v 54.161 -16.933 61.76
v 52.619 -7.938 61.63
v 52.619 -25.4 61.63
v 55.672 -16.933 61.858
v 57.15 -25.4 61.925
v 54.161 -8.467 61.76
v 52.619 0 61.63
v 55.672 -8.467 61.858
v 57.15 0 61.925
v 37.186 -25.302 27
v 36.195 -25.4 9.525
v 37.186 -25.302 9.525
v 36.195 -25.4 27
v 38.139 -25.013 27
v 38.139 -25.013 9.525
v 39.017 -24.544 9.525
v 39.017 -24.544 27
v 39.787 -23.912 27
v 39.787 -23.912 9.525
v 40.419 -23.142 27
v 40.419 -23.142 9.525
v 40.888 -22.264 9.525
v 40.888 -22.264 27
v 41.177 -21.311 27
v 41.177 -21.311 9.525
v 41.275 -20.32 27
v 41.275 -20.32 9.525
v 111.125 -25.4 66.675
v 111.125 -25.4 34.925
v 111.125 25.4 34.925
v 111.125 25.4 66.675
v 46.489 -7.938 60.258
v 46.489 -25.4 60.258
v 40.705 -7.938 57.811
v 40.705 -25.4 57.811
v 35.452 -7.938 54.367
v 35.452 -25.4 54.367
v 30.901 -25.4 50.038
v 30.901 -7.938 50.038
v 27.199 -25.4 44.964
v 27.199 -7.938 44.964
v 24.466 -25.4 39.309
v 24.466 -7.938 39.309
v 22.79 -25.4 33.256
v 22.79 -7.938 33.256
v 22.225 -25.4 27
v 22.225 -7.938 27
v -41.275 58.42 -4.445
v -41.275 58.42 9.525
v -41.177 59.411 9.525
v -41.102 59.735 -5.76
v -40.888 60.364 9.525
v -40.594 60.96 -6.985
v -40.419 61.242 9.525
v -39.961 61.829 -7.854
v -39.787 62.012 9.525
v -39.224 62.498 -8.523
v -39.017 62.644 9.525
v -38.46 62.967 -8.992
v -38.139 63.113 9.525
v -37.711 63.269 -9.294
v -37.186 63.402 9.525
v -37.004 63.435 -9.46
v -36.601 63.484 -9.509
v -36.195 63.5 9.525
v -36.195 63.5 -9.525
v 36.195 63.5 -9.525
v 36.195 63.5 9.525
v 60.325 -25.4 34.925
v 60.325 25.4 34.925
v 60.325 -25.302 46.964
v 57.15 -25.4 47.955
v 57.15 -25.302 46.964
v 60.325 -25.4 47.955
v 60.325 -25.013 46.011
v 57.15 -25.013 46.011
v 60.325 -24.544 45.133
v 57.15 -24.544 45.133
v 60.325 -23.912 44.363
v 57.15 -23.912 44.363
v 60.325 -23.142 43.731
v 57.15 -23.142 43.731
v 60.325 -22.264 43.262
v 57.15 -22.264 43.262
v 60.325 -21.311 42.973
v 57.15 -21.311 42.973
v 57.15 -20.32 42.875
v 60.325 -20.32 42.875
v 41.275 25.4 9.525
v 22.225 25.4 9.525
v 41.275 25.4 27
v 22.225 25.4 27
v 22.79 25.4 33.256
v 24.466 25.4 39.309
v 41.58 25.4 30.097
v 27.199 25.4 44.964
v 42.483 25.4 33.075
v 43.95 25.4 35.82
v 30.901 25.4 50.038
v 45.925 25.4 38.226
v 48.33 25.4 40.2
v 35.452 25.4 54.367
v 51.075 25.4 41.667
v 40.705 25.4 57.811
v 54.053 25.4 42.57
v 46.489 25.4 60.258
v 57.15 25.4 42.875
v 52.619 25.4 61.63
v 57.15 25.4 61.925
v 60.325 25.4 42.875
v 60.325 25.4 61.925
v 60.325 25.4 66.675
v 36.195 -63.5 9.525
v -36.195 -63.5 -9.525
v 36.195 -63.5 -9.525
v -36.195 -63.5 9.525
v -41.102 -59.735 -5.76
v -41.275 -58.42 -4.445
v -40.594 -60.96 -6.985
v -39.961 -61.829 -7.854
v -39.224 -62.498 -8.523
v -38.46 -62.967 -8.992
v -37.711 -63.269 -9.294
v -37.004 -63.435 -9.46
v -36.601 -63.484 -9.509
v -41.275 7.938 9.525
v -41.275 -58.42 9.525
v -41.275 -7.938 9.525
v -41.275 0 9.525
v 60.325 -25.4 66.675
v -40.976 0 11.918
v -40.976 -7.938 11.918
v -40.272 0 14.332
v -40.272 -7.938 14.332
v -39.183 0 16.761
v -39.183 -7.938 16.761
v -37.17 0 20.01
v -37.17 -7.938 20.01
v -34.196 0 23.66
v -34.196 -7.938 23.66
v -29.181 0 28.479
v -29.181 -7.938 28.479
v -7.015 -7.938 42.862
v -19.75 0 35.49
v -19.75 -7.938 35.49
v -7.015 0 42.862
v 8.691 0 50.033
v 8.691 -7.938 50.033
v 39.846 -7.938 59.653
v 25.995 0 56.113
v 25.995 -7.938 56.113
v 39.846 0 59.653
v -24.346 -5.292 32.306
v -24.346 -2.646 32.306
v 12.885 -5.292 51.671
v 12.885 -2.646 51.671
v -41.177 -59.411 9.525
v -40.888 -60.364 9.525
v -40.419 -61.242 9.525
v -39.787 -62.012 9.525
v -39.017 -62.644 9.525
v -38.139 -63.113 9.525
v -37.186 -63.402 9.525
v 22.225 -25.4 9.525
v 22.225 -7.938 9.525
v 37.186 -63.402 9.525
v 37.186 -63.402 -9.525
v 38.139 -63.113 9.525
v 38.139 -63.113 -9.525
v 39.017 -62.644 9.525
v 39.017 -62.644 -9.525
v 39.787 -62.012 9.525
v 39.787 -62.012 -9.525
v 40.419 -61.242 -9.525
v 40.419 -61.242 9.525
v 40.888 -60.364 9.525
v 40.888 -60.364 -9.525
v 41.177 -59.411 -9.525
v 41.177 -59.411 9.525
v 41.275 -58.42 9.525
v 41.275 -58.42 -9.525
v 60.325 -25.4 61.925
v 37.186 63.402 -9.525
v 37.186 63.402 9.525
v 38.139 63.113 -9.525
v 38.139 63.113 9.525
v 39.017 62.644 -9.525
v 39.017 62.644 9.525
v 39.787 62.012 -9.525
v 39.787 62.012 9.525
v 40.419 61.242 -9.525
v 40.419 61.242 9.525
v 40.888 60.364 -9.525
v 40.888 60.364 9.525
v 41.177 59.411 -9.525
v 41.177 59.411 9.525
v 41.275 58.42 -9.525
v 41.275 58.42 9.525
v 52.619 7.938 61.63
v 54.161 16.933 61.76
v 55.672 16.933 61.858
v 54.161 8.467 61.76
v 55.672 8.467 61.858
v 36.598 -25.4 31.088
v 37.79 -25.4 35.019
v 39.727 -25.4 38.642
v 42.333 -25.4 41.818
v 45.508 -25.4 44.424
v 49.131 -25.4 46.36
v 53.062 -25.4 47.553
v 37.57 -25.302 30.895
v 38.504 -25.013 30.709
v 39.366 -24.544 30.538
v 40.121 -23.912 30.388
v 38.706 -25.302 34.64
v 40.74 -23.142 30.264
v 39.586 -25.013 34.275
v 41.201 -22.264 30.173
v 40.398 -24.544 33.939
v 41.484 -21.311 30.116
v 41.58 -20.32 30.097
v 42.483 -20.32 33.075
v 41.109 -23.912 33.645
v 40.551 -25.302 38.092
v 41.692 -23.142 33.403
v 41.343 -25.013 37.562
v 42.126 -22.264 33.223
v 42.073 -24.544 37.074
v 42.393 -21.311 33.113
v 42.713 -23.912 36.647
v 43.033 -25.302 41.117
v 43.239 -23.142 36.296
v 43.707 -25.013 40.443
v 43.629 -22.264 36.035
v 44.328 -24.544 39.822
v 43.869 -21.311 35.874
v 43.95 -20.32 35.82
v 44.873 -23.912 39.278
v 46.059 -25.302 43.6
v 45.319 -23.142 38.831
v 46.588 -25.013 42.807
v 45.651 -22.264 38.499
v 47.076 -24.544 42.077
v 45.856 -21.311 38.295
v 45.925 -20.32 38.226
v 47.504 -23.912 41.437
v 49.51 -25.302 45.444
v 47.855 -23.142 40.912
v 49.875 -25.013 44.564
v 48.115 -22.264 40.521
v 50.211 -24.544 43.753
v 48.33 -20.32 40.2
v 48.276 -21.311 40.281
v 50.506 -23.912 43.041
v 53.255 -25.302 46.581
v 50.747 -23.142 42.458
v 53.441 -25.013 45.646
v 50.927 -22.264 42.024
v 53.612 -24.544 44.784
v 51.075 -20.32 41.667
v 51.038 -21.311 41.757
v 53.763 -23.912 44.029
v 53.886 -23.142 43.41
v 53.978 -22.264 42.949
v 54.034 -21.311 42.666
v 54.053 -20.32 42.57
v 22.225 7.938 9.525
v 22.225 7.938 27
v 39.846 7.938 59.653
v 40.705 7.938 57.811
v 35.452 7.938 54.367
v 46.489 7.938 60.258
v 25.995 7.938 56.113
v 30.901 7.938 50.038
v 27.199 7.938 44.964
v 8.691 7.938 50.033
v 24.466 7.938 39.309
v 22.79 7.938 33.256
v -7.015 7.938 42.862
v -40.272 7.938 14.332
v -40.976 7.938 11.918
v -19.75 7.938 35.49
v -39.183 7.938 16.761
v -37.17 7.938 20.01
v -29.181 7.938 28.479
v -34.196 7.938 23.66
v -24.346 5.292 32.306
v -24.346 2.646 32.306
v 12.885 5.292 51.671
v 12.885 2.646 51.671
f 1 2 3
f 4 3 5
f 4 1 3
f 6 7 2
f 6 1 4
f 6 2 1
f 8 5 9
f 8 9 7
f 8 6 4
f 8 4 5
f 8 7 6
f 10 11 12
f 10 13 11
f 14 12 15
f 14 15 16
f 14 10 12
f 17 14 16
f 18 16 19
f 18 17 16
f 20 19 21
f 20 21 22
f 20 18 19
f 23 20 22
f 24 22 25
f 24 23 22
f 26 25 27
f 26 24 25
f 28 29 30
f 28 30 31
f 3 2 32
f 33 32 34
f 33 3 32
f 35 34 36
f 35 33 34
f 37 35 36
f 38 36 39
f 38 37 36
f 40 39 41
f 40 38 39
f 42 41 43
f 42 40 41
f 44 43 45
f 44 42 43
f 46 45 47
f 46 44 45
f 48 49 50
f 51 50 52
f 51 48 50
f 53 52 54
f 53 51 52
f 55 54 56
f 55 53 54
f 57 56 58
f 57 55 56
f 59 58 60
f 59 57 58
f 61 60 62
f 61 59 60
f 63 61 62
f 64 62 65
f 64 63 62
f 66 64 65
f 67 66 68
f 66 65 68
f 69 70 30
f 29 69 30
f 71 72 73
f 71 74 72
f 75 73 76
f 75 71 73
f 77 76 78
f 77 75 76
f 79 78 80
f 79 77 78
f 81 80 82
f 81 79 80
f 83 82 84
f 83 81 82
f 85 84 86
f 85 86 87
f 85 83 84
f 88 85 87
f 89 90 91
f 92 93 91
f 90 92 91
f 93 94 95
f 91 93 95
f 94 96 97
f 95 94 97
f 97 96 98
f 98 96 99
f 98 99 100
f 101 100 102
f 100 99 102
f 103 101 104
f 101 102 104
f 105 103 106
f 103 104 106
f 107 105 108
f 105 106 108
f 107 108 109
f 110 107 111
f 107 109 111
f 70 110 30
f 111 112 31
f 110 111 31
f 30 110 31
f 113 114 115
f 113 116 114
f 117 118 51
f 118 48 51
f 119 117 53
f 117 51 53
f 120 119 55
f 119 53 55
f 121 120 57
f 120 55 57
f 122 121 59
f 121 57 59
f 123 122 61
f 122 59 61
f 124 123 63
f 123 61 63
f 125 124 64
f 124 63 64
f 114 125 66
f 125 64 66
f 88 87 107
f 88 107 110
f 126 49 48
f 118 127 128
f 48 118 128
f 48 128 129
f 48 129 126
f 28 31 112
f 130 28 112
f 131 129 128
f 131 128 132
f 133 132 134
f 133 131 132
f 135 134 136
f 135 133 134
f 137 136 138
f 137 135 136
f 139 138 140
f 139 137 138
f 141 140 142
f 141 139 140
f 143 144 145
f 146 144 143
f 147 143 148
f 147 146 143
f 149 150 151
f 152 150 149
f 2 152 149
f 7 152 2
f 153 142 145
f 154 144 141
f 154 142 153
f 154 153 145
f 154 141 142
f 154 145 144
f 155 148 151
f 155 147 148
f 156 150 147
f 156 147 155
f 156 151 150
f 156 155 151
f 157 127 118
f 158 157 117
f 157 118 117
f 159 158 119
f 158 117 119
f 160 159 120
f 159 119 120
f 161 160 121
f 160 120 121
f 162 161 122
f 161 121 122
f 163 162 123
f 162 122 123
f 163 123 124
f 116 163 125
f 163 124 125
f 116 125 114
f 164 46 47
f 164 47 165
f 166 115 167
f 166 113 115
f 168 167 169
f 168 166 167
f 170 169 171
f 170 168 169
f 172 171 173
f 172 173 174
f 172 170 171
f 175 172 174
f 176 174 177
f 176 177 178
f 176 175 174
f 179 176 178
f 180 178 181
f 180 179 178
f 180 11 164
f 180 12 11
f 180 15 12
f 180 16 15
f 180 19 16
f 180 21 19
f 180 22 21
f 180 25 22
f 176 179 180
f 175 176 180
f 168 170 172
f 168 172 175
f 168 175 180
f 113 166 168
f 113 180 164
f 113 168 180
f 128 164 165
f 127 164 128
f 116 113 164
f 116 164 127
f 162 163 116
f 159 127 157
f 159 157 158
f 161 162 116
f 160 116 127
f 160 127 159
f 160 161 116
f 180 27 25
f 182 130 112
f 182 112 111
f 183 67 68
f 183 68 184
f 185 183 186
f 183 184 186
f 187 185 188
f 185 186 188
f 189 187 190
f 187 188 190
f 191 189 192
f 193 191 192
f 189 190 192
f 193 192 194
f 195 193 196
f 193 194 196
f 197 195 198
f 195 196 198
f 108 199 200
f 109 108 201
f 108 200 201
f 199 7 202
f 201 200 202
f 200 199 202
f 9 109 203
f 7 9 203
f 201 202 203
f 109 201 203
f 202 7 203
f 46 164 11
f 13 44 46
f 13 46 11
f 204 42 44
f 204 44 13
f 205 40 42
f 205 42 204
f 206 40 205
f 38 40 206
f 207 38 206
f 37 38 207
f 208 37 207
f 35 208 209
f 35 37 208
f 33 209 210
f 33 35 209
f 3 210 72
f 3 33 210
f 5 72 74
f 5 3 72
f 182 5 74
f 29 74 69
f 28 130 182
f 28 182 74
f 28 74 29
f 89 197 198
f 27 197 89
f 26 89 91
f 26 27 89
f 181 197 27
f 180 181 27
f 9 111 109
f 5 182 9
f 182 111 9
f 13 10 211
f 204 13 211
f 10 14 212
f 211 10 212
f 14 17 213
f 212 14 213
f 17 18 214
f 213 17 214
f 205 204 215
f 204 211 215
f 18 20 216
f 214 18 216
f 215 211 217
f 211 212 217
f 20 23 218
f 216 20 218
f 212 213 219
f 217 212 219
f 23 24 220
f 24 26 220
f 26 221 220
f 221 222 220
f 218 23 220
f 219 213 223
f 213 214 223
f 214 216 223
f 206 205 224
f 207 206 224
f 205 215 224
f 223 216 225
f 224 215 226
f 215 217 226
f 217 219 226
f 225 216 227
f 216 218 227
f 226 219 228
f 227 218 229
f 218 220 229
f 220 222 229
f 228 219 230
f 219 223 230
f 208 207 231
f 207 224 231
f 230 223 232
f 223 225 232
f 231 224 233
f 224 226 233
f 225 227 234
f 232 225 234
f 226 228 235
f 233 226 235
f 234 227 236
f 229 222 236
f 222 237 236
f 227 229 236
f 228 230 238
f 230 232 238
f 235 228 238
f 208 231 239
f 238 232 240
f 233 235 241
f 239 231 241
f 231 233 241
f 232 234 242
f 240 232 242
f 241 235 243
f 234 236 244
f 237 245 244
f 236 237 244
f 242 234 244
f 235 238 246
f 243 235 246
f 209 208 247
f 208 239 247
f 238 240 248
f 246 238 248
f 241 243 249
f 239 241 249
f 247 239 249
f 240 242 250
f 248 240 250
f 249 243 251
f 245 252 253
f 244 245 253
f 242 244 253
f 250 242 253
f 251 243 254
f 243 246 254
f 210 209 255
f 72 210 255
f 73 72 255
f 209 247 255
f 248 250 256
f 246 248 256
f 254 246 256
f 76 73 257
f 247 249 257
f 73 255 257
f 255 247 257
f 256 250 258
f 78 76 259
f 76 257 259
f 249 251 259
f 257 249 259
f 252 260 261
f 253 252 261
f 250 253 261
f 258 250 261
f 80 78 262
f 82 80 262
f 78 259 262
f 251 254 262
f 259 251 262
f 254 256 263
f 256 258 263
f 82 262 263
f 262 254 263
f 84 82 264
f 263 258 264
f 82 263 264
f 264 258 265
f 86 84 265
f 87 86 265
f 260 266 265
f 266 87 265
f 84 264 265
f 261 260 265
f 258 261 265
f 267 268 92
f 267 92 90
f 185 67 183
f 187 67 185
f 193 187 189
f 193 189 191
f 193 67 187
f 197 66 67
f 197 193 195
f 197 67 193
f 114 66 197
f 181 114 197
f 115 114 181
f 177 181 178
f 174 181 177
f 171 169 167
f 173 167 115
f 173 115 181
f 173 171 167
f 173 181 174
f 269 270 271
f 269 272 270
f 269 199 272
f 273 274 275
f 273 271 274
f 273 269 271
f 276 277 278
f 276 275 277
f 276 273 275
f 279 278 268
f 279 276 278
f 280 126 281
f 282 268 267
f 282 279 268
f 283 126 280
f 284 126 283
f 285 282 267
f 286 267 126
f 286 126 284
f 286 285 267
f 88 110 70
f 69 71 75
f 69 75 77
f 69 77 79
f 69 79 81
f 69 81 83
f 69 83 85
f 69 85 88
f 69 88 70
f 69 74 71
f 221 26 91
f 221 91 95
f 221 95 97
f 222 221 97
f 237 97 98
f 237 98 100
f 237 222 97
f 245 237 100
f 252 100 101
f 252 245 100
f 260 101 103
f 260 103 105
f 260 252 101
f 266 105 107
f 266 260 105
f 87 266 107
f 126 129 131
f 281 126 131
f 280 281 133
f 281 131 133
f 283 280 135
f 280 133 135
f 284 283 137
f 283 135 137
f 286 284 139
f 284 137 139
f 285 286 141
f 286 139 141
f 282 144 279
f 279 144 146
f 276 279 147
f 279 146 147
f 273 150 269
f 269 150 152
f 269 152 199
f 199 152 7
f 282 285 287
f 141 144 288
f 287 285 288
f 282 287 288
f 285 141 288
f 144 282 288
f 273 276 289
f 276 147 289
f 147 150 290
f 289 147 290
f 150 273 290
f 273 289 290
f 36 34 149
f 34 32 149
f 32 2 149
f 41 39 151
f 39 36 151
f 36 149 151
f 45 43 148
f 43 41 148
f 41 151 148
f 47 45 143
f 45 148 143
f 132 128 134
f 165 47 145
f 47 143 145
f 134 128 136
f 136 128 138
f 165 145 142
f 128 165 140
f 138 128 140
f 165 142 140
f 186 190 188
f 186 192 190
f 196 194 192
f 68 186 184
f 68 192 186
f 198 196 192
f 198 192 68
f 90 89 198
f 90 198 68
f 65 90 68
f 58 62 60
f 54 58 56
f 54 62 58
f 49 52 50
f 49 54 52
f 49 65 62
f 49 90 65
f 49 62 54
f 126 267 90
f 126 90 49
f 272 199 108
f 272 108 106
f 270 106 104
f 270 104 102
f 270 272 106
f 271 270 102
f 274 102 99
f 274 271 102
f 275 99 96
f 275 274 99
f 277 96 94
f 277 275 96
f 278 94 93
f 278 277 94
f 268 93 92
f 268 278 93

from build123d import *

# Parameters (mm, degrees)
F1_DEPTH = 63.5
F0_W     = 49.9602150655
F0_H     = 19.05
F2_DEPTH = 25.4
F3_DEPTH = 7.9375
F4_R     = 5.08


with BuildPart() as f1:
    # F0 (on Front) → F1 (new body, symmetric)
    with BuildSketch(Plane.XZ):
        Polygon((-41.275, -9.525), (41.275, -9.525), (41.275, 9.525), (22.225, 9.525), (-41.275, 9.525), align=None)
    extrude(amount=F1_DEPTH, both=True)

    # F0 (on Front) → F2 (join, symmetric)
    with BuildSketch(Plane.XZ):
        with BuildLine():
            Line((22.225, 9.525), (41.275, 9.525))
            Line((41.275, 9.525), (41.275, 27.0002))
            ThreePointArc((41.275, 27.0002), (45.9246798487, 38.2255201513), (57.15, 42.8752))
            Line((57.15, 42.8752), (60.325, 42.8752))
            Line((60.325, 42.8752), (60.325, 61.9252))
            Line((60.325, 61.9252), (57.15, 61.9252))
            add(Edge.make_bspline(
                [(52.6185648508, 61.6299808322), (54.1767284716, 61.7748193582), (55.6895521193, 61.8740152427), (57.15, 61.9252)],
                knots=[106.7587971819, 106.7587971819, 106.7587971819, 106.7587971819, 111.5045361635, 111.5045361635, 111.5045361635, 111.5045361635], degree=3))
            ThreePointArc((52.6185648508, 61.6299808322), (30.9010381388, 50.0381605479), (22.225, 27.0002))
            Line((22.225, 27.0002), (22.225, 9.525))
        make_face()
        with Locations((85.3051075328, 52.4002)):
            Rectangle(F0_W, F0_H)
        Polygon((110.2852150655, 42.8752), (60.325, 42.8752), (60.325, 34.925), (111.125, 34.925), (111.125, 66.675), (60.325, 66.675), (60.325, 61.9252), (110.2852150655, 61.9252), align=None)
    extrude(amount=F2_DEPTH, both=True)

    # F0 (on Front) → F3 (join, symmetric)
    with BuildSketch(Plane.XZ):
        with BuildLine():
            add(Edge.make_bspline(
                [(-41.275, 9.525), (-40.4300702784, 32.0156986362), (17.5665582788, 58.3717344605), (52.6185648508, 61.6299808322)],
                knots=[0, 0, 0, 0, 106.7587971819, 106.7587971819, 106.7587971819, 106.7587971819], degree=3))
            Line((-41.275, 9.525), (22.225, 9.525))
            Line((22.225, 9.525), (22.225, 27.0002))
            ThreePointArc((22.225, 27.0002), (30.9010381388, 50.0381605479), (52.6185648508, 61.6299808322))
        make_face()
    extrude(amount=F3_DEPTH, both=True)

    # F4
    f4_edges = [f1.edges().sort_by_distance(p)[0] for p in [
        (41.275, -63.5, 0),
        (41.275, 63.5, 0),
        (58.7375, -25.4, 42.8752),
        (-41.275, -63.5, 0),
        (-41.275, 63.5, 0),
        (-41.275, 0, -9.525),
    ]]
    fillet(f4_edges, radius=F4_R)


solid = f1.part
